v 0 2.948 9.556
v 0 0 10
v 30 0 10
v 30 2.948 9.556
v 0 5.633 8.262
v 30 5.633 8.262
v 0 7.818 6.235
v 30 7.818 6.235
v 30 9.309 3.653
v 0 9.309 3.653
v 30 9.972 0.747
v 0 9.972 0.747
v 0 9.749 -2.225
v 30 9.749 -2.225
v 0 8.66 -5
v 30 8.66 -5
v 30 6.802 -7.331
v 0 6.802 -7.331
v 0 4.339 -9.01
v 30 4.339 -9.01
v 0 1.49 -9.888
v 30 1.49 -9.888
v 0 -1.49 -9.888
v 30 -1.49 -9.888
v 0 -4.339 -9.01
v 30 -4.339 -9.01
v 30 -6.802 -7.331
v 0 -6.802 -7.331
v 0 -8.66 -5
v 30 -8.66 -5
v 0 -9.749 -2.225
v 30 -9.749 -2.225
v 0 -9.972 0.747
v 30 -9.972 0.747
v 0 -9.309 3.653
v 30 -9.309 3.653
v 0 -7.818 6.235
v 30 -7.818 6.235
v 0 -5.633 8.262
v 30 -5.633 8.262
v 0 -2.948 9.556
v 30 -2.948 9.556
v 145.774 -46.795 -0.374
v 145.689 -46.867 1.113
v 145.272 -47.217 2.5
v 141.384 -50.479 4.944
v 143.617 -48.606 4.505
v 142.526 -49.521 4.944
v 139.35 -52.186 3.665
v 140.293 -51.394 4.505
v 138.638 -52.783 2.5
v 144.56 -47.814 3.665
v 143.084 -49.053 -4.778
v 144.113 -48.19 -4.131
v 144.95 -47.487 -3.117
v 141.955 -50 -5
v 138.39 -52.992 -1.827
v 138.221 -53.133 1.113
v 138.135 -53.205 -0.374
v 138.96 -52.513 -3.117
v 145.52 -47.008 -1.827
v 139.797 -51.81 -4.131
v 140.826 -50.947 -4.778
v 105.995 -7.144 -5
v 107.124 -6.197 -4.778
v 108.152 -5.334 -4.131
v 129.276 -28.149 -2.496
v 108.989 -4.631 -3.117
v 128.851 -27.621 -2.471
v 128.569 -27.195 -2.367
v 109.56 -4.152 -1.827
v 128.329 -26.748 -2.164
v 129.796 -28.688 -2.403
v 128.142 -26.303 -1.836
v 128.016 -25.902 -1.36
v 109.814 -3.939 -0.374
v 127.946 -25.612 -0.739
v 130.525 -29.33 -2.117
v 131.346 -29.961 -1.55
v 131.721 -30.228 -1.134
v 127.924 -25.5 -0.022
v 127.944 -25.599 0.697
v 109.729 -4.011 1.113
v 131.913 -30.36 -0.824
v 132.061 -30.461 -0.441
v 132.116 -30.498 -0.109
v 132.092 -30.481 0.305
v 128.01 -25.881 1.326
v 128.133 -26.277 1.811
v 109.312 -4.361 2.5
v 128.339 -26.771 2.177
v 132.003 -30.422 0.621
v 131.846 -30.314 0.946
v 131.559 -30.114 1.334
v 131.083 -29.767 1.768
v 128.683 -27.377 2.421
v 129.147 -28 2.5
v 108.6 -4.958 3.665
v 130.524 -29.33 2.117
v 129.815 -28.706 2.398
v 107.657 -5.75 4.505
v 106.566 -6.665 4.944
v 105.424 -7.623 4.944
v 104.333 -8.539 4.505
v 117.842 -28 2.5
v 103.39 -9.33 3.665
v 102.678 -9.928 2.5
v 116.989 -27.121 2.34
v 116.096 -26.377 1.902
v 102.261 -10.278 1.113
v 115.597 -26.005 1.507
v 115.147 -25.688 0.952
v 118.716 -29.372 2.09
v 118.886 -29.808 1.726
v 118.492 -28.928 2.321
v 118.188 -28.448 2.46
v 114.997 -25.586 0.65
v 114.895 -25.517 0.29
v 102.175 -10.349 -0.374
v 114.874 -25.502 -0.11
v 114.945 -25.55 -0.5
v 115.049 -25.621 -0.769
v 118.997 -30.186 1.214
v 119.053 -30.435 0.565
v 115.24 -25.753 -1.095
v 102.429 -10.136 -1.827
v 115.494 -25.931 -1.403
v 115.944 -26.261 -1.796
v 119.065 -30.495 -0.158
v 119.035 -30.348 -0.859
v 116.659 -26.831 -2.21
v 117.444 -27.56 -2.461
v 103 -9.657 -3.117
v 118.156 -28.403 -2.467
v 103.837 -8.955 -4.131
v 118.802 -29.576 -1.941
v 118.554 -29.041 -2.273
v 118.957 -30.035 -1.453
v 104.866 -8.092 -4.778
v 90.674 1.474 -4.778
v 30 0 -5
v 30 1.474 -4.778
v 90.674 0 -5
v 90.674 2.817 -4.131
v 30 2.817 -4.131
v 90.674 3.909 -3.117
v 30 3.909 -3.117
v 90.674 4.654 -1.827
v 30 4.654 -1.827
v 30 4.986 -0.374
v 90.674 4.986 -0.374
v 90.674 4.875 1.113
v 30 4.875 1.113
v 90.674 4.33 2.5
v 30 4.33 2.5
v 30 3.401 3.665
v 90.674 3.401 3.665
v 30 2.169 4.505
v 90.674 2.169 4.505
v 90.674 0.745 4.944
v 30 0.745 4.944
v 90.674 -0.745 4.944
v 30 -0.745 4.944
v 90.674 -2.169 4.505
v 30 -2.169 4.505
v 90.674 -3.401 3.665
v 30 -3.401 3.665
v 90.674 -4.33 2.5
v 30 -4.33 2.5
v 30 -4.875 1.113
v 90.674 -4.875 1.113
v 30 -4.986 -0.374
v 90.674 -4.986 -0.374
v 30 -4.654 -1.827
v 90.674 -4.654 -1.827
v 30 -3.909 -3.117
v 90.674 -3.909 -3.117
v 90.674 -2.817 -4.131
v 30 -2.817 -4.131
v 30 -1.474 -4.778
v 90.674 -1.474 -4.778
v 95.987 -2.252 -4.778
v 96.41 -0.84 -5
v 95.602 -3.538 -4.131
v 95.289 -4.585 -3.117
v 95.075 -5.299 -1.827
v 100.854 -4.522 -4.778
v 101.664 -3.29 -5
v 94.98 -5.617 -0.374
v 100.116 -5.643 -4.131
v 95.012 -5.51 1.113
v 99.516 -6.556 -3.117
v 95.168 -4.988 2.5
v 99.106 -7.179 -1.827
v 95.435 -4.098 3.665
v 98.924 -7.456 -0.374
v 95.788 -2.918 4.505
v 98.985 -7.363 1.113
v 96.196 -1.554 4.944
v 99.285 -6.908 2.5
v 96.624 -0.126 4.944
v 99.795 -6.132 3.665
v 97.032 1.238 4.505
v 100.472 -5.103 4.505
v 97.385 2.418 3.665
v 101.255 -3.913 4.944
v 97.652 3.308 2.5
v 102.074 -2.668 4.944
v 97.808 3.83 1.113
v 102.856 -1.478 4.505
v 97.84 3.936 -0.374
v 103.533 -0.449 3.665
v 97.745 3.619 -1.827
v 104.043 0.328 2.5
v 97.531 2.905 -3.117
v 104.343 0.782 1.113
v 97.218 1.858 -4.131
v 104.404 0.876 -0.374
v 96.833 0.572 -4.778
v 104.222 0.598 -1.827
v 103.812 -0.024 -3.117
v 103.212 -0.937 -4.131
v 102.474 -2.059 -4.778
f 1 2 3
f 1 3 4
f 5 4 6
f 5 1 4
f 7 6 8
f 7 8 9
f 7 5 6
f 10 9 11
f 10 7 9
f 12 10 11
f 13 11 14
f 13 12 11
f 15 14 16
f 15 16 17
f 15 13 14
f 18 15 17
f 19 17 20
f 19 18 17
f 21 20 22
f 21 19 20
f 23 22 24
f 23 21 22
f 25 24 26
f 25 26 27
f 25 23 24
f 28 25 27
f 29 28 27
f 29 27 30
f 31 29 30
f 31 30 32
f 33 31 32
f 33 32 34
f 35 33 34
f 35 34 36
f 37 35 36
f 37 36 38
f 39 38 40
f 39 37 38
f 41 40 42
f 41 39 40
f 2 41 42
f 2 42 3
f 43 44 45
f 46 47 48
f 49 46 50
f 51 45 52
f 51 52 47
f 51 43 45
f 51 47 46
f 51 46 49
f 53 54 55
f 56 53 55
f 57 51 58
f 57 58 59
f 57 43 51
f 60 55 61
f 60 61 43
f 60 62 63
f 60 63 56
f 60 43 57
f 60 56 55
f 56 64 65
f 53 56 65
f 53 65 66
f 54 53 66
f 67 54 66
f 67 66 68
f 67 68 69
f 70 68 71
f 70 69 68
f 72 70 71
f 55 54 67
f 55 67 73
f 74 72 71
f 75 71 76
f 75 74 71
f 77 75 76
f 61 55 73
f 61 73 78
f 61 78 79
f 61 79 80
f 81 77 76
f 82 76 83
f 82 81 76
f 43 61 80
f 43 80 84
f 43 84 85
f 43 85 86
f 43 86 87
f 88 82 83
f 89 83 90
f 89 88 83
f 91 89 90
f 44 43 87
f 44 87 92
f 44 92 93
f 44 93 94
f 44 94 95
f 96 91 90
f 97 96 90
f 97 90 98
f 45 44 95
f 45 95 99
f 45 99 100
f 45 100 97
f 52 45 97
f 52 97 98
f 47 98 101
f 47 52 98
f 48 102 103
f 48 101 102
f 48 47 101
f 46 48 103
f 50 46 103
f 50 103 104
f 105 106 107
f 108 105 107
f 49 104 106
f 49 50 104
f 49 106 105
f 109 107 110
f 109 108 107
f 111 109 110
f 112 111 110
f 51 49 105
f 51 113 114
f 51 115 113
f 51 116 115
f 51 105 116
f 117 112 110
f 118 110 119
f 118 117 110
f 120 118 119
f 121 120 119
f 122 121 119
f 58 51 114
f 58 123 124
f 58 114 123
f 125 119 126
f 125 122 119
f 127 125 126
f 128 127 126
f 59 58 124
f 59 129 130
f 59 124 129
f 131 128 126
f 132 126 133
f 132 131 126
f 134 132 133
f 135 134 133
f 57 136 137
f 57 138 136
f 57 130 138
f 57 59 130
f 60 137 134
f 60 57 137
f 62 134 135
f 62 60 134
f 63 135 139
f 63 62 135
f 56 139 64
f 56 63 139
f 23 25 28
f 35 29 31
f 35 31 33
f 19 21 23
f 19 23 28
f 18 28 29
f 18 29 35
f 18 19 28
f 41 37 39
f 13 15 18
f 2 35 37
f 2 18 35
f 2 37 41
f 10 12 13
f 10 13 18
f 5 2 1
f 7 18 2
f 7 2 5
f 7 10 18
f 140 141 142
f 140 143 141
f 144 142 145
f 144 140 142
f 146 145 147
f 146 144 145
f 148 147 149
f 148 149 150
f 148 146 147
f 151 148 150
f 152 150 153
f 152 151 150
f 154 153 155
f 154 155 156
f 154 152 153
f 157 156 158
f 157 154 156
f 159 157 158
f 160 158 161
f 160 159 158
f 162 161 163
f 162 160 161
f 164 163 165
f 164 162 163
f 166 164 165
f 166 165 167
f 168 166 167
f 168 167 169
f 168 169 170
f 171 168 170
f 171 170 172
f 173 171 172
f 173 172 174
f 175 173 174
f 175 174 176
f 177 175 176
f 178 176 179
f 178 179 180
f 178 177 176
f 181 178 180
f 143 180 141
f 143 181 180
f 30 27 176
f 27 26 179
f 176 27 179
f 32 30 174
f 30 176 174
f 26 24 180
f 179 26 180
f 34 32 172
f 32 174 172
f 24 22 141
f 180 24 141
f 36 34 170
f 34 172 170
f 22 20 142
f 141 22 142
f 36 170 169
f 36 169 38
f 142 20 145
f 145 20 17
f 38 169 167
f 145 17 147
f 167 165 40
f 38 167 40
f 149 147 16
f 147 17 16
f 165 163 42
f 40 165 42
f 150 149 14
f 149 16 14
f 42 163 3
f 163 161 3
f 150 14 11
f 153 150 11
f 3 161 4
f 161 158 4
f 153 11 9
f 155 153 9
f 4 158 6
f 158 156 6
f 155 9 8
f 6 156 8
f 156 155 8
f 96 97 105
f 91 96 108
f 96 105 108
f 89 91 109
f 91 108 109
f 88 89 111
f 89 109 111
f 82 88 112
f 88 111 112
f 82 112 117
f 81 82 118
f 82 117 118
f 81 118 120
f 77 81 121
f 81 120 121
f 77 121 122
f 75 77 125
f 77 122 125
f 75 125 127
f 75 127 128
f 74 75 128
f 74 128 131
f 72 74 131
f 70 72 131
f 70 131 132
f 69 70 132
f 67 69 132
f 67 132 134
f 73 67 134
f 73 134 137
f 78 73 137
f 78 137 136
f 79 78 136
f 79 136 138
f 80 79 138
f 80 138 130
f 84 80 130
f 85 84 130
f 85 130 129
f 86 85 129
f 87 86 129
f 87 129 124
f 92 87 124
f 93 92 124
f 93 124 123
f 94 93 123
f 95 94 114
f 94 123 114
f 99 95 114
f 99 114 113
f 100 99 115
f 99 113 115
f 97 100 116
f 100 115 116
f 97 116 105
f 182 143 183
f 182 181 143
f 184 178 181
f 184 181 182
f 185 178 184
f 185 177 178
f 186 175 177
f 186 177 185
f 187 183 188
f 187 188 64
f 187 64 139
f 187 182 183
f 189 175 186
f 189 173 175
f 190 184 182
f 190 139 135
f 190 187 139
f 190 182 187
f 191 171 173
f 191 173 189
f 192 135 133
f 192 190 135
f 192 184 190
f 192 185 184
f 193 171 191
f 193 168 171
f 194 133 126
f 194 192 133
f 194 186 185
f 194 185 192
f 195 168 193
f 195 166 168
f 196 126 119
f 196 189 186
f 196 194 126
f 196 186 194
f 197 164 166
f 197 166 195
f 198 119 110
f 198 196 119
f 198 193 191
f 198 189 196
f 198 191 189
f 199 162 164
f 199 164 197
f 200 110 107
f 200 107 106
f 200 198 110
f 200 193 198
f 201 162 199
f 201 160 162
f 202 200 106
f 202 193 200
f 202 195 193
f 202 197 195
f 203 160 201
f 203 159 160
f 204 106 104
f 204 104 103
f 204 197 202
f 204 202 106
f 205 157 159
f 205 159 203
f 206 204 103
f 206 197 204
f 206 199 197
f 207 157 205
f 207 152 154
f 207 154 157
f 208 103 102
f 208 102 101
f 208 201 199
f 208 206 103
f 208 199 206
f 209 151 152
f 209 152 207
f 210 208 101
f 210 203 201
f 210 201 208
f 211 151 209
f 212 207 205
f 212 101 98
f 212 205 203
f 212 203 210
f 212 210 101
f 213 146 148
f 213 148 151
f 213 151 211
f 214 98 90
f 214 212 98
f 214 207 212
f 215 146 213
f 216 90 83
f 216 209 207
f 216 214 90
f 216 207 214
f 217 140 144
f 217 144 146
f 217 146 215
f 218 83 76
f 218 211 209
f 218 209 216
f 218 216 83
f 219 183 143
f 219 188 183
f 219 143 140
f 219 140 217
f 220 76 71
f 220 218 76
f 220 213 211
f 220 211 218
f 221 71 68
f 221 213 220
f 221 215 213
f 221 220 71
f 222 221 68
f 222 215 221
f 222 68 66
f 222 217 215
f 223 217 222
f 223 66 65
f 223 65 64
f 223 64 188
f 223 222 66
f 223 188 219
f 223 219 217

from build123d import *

# Parameters (mm, degrees)
PRUREZ_R                 = 5
SKICA3_R                 = 10
P_IDAT_VYSUNUT_M1_DEPTH  = 30
SKICA4_R                 = 2.5
ODEBRAT_VYSUNUT_M1_DEPTH = 156.515429595


with BuildPart() as part:
    # Táhnout po křivce1: sweep along a path in Draha
    with BuildLine(Plane.XY) as t_hnout_po_k_ivce1_path:
        Line((0, 0), (90.673846837, 0))
        ThreePointArc((90.673846837, 0), (99.126212072, -1.873844259), (105.994735699, -7.144247806))
        Line((105.994735699, -7.144247806), (141.954981559, -50))
    # Prurez → Táhnout po křivce1 (sweep)
    with BuildSketch(Plane(origin=(0, 0, 0), x_dir=(0, 0, -1), z_dir=(1, 0, 0))):
        Circle(PRUREZ_R)
    sweep(path=t_hnout_po_k_ivce1_path.line)

    # Skica3 → Přidat vysunutím1 (add)
    with BuildSketch(Plane.ZY):
        Circle(SKICA3_R)
    extrude(amount=-P_IDAT_VYSUNUT_M1_DEPTH)

    # Skica4 → Odebrat vysunutím1 (cut, through all)
    with BuildSketch(Plane.ZY):
        with Locations((0, -28)):
            Circle(SKICA4_R)
    extrude(amount=-ODEBRAT_VYSUNUT_M1_DEPTH, mode=Mode.SUBTRACT)


solid = part.part
